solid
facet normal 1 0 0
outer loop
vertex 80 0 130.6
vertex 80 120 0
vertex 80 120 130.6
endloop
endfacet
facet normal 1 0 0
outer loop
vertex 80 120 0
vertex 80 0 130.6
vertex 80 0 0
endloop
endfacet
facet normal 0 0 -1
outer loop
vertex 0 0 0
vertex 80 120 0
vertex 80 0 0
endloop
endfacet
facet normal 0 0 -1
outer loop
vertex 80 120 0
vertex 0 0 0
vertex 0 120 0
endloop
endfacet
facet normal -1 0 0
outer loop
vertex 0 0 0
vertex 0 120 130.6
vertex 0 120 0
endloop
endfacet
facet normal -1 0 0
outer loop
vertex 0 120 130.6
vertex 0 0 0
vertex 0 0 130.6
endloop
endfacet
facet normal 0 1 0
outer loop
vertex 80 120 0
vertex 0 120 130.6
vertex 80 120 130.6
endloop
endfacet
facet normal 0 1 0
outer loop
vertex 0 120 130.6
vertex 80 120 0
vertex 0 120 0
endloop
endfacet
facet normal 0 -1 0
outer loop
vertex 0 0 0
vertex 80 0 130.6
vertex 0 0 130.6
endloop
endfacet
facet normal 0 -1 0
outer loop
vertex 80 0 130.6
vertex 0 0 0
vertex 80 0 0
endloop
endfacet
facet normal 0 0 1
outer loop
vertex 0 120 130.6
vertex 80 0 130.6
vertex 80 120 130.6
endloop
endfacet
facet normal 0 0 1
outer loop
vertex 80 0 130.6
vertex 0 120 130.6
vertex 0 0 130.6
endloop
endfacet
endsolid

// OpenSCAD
// Architectural thermal visualization; dimensions are scaled.
color([0.6822,0,0.3178,0.75]) translate([0,0,0.00000]) cube([80.00000,120.00000,18.00000]);
color([0.9987,0,0.0013,0.75]) translate([0,0,18.00000]) cube([80.00000,120.00000,10.00000]);
color([1.0000,0,0.0000,0.75]) translate([0,0,28.00000]) cube([80.00000,120.00000,10.00000]);
color([0.9718,0,0.0282,0.75]) translate([0,0,38.00000]) cube([80.00000,120.00000,1.50000]);
color([0.9476,0,0.0524,0.75]) translate([0,0,39.50000]) cube([80.00000,120.00000,3.20000]);
color([0.9200,0,0.0800,0.75]) translate([0,0,42.70000]) cube([80.00000,120.00000,1.50000]);
color([0.8924,0,0.1076,0.75]) translate([0,0,44.20000]) cube([80.00000,120.00000,3.20000]);
color([0.8615,0,0.1385,0.75]) translate([0,0,47.40000]) cube([80.00000,120.00000,1.50000]);
color([0.8305,0,0.1695,0.75]) translate([0,0,48.90000]) cube([80.00000,120.00000,3.20000]);
color([0.7962,0,0.2038,0.75]) translate([0,0,52.10000]) cube([80.00000,120.00000,1.50000]);
color([0.7618,0,0.2382,0.75]) translate([0,0,53.60000]) cube([80.00000,120.00000,3.20000]);
color([0.7241,0,0.2759,0.75]) translate([0,0,56.80000]) cube([80.00000,120.00000,1.50000]);
color([0.6864,0,0.3136,0.75]) translate([0,0,58.30000]) cube([80.00000,120.00000,3.20000]);
color([0.6452,0,0.3548,0.75]) translate([0,0,61.50000]) cube([80.00000,120.00000,1.50000]);
color([0.6041,0,0.3959,0.75]) translate([0,0,63.00000]) cube([80.00000,120.00000,3.20000]);
color([0.5596,0,0.4404,0.75]) translate([0,0,66.20000]) cube([80.00000,120.00000,1.50000]);
color([0.5152,0,0.4848,0.75]) translate([0,0,67.70000]) cube([80.00000,120.00000,3.20000]);
color([0.4673,0,0.5327,0.75]) translate([0,0,70.90000]) cube([80.00000,120.00000,1.50000]);
color([0.4194,0,0.5806,0.75]) translate([0,0,72.40000]) cube([80.00000,120.00000,3.20000]);
color([0.2177,0,0.7823,0.75]) translate([0,0,75.60000]) cube([80.00000,120.00000,5.00000]);
color([0.0000,0,1.0000,0.75]) translate([0,0,80.60000]) cube([80.00000,120.00000,50.00000]);
